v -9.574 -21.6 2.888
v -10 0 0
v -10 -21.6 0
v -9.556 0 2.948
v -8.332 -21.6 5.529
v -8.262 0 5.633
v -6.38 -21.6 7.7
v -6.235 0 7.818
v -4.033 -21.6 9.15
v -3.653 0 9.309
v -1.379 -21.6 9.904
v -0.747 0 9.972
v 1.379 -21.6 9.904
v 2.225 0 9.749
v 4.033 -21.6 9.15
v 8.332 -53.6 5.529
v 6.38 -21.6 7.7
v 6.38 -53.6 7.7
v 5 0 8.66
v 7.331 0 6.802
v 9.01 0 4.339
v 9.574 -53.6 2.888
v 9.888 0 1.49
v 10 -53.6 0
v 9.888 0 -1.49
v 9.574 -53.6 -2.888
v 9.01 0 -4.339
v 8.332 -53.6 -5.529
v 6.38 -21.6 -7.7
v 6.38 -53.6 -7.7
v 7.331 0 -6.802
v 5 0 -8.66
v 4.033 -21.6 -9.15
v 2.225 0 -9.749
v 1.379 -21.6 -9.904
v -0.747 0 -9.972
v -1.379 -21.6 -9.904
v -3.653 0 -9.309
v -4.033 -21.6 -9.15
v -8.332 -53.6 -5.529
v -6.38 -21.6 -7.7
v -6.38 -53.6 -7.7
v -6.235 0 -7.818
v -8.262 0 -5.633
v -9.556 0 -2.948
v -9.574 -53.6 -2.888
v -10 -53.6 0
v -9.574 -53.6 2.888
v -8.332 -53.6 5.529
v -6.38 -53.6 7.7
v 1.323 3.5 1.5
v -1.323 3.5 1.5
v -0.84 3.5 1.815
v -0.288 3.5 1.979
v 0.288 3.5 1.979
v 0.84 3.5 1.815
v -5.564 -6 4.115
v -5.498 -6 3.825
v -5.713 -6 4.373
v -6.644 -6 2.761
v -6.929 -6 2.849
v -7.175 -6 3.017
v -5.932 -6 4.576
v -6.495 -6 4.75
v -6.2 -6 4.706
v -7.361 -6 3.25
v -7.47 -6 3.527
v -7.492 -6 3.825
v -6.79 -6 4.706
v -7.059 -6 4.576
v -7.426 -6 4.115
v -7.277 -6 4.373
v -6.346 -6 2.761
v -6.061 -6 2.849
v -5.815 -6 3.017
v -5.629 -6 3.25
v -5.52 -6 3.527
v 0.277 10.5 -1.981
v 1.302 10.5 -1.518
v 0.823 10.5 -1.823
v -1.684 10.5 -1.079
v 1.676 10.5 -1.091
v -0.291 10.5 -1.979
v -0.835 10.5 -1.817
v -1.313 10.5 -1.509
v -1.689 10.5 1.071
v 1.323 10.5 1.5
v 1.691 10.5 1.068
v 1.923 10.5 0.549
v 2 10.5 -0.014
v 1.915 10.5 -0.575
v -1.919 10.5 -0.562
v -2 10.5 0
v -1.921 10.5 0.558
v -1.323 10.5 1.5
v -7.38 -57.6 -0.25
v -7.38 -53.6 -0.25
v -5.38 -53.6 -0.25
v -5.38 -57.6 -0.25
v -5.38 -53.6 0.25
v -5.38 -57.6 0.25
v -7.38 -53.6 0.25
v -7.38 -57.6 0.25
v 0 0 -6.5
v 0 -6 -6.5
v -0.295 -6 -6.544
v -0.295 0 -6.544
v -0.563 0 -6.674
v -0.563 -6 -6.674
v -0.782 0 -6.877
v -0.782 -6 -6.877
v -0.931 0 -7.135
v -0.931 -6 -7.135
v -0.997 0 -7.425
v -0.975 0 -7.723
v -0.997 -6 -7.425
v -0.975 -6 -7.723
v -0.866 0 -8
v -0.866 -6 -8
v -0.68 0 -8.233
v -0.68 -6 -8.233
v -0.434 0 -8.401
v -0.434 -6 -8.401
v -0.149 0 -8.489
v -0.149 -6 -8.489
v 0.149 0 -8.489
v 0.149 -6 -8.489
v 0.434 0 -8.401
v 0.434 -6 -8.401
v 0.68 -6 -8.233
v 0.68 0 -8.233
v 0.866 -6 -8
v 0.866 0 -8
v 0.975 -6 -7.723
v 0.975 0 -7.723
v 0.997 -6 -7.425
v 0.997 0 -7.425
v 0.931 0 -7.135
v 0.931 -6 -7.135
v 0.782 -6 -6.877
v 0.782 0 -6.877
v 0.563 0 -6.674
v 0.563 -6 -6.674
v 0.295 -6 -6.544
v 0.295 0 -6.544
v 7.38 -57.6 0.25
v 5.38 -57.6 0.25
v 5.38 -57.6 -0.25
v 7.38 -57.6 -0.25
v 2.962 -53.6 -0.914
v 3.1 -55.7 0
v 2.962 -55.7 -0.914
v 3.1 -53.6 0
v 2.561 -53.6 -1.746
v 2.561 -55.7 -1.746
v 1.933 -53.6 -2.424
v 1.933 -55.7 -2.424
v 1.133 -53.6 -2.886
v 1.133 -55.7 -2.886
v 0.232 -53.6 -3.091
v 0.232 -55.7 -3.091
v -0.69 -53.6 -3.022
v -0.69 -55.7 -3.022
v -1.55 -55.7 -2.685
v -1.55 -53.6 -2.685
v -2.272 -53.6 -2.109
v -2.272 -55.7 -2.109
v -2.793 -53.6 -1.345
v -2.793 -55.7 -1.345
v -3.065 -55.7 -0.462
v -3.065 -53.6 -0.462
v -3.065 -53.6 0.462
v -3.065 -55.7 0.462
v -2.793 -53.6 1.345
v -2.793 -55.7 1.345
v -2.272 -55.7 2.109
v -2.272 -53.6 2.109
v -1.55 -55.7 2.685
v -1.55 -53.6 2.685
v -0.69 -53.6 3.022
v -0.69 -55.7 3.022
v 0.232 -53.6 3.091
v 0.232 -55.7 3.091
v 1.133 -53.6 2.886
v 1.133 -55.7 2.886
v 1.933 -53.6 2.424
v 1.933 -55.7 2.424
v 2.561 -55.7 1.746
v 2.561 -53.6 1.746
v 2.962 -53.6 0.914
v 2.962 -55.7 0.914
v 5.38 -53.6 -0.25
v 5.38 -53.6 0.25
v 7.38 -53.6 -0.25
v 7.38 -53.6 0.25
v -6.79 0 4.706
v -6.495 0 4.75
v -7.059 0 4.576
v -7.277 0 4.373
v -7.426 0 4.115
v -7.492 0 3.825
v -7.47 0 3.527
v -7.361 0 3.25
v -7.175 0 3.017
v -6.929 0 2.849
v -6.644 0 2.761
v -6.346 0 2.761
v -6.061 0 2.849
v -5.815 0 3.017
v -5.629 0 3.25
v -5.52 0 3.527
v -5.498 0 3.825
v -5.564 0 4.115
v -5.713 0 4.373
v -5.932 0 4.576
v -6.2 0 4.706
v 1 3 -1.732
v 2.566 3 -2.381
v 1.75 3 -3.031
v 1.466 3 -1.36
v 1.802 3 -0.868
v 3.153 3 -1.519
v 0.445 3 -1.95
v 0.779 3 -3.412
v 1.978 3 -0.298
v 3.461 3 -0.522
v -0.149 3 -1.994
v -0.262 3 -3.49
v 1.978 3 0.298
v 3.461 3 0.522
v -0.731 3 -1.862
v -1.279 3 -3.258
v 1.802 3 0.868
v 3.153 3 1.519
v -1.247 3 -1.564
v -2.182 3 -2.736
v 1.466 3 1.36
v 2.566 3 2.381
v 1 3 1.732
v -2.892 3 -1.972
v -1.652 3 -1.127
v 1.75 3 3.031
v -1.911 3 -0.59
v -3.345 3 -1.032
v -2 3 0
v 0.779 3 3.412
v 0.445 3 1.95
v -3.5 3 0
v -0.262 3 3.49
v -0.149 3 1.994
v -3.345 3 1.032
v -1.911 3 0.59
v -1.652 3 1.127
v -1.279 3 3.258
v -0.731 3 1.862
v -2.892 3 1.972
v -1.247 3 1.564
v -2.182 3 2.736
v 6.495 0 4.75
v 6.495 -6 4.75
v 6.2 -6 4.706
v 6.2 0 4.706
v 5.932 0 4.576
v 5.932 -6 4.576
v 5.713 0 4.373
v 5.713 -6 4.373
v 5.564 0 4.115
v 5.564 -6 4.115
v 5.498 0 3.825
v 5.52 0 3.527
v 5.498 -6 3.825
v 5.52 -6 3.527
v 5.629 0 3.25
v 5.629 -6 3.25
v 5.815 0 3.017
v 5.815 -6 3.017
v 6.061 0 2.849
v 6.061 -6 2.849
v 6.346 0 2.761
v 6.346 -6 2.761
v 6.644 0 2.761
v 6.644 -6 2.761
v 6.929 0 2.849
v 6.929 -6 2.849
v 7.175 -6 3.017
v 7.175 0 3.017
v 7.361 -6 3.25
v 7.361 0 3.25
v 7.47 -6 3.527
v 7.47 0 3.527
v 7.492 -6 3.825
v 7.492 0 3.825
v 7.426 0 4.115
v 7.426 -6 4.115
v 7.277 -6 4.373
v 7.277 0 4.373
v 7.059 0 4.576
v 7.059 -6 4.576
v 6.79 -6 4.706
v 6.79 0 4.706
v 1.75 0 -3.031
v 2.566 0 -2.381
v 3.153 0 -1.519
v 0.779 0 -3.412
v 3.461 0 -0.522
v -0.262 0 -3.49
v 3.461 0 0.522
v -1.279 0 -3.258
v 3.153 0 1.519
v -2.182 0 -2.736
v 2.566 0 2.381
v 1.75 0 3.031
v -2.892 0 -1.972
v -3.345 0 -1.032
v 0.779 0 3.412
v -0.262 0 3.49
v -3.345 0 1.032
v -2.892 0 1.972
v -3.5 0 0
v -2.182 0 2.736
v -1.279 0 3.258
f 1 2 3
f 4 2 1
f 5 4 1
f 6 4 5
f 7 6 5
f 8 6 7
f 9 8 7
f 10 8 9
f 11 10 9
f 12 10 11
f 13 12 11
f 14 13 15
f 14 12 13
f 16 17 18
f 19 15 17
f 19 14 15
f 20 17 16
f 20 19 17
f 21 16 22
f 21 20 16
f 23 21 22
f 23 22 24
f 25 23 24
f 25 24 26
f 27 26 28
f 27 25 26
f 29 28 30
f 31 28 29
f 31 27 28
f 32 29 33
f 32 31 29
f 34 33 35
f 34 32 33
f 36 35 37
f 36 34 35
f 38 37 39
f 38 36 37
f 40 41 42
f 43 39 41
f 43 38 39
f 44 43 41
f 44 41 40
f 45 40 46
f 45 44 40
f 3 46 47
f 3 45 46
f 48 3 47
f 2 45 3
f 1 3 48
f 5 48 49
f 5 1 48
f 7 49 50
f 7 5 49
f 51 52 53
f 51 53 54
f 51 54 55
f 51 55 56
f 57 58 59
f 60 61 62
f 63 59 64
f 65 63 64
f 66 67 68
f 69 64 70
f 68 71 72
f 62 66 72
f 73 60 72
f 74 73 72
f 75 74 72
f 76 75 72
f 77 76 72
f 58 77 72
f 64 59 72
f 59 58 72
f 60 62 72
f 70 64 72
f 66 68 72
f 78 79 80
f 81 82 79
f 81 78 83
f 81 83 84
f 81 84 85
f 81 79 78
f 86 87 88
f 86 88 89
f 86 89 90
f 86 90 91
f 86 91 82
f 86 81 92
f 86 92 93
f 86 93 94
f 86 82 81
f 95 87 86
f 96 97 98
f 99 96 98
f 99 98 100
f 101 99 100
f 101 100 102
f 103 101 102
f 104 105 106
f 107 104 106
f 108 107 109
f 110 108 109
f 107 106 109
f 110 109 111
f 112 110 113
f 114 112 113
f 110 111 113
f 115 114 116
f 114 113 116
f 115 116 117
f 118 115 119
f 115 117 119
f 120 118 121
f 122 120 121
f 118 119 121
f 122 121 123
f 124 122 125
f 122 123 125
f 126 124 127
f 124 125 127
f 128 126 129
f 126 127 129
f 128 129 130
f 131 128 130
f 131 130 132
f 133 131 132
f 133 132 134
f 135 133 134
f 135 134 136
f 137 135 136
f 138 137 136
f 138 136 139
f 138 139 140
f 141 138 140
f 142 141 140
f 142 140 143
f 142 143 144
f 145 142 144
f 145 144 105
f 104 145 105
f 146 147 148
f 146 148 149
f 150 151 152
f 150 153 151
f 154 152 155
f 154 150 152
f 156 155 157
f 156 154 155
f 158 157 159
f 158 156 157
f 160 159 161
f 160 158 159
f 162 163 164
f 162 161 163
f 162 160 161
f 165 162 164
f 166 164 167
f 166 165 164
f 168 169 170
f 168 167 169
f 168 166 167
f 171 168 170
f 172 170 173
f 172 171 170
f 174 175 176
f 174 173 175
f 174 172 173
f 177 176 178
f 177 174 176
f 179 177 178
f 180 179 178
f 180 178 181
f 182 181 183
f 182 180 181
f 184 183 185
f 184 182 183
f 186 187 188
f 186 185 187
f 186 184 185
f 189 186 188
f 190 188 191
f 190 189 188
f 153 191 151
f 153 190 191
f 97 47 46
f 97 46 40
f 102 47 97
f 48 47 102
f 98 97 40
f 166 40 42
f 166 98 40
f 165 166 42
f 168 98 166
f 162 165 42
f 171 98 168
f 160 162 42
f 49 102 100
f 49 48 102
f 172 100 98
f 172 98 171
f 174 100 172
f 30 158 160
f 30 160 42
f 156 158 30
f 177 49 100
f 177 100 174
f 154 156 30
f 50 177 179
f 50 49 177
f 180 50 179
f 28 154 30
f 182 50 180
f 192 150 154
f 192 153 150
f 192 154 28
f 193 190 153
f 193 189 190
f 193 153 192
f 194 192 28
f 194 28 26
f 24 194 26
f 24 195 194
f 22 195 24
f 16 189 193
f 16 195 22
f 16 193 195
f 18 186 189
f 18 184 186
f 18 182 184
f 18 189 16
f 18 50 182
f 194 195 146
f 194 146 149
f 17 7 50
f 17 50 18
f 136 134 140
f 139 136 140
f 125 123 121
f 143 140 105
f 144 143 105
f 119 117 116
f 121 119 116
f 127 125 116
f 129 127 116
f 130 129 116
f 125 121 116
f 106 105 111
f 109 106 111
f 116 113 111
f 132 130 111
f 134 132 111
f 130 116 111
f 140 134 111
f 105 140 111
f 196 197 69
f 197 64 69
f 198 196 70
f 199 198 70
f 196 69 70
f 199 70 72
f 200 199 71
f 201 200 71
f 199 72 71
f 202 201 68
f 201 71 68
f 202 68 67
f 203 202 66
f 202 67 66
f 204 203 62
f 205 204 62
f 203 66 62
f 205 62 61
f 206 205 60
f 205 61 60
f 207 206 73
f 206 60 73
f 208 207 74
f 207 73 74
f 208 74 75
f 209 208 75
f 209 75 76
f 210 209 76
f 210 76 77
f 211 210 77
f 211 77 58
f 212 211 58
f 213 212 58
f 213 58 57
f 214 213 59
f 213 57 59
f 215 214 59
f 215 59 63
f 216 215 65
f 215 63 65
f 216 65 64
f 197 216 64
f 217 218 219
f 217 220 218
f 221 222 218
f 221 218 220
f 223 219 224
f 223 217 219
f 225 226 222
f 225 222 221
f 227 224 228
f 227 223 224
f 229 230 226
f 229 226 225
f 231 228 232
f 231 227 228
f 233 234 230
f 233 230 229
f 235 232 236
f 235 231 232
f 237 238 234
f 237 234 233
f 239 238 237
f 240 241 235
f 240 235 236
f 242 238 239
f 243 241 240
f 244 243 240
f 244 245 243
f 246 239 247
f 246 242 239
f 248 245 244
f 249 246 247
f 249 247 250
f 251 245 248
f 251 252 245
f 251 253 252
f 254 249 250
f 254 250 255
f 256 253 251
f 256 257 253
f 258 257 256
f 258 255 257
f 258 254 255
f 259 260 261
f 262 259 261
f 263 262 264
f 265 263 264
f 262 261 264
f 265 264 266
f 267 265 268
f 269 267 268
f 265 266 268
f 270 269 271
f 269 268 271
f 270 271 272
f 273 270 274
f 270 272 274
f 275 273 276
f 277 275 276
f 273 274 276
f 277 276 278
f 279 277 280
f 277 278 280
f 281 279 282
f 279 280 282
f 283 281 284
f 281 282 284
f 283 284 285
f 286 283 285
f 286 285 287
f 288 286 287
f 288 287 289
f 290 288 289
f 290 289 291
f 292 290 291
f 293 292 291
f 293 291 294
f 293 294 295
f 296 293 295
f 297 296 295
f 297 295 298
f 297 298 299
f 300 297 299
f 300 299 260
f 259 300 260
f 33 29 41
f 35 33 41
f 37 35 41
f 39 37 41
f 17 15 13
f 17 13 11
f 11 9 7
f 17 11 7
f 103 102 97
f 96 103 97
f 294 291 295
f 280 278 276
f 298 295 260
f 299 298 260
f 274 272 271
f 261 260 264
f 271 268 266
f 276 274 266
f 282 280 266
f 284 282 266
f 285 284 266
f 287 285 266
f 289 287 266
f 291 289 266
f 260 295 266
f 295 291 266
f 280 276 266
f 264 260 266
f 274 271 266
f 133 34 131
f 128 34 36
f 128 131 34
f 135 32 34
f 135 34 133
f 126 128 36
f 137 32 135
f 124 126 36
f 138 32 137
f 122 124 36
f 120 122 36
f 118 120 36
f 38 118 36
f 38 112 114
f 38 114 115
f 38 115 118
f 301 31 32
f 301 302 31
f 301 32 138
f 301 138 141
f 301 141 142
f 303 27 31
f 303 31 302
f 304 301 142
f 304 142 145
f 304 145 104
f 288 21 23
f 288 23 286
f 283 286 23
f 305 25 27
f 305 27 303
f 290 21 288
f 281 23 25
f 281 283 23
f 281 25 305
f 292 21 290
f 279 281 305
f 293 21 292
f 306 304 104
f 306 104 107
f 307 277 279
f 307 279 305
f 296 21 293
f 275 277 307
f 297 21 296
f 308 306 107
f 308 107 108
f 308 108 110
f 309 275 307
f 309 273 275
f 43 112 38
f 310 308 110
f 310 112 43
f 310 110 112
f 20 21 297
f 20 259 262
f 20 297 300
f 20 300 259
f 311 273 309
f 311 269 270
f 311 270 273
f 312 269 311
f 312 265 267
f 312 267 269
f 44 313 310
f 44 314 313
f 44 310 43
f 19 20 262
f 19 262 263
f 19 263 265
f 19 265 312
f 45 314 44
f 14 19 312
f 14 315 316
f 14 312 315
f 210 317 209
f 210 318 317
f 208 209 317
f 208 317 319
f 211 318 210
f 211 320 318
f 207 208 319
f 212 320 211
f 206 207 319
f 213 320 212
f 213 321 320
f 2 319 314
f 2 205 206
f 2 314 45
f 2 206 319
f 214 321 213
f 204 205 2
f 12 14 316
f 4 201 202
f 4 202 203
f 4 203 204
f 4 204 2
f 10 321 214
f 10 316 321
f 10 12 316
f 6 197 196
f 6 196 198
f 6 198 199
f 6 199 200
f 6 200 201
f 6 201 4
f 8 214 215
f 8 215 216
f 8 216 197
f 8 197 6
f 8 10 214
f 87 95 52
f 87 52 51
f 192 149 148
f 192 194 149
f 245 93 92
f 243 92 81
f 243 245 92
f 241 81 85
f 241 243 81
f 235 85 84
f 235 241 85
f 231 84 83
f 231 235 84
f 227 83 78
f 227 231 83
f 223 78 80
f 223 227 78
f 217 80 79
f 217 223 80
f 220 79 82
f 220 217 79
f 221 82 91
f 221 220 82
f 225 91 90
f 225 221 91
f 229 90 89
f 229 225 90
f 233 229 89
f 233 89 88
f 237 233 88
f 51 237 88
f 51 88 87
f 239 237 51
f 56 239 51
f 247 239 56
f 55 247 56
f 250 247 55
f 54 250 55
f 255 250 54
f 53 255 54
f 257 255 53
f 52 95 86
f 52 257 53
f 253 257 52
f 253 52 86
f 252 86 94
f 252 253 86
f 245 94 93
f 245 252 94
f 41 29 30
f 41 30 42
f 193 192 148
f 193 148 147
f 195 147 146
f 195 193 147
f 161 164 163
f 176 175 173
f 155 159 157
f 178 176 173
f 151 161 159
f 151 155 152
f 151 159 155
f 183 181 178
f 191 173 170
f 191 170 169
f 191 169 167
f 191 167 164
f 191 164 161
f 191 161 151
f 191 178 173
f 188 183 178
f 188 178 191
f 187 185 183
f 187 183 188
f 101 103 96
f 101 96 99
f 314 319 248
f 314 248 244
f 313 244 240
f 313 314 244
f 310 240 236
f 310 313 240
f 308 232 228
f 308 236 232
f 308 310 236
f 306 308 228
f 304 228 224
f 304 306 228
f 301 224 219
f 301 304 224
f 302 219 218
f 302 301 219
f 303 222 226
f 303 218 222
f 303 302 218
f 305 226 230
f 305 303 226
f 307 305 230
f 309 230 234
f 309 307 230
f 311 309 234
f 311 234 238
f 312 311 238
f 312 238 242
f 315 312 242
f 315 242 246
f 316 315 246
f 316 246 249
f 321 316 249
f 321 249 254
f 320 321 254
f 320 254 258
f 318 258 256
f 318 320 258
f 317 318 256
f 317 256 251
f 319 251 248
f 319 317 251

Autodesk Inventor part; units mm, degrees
ref_plane "YZ Plane" through (0, 0, 0) normal (1, 0, 0) x (0, 1, 0)
ref_plane "XZ Plane" through (0, 0, 0) normal (0, 1, 0) x (-1, 0, 0)
ref_plane "XY Plane" through (0, 0, 0) normal (0, 0, 1) x (1, 0, 0)
sketch "Эскиз1" plane through (0, 0, 0) normal (0, 1, 0) x (-1, 0, 0)
  circle A0 centre (0, 0) radius 10
  circle A1 centre (0, 0) radius 3.5
  circle A2 centre (0, 0) radius 2
  dimension "d0" = 20
  dimension "d1" = 7
  dimension "d2" = 4
extrude "Выдавливание1" add sketch "Эскиз1" against normal blind 21.6 contours A0 | A1 | A2
extrude "Выдавливание2" add sketch "Эскиз1" along normal blind 3 contours A1
extrude "Выдавливание3" add sketch "Эскиз1" along normal blind 10.5 contours A2
sketch "Эскиз2" plane through (0, 10.5, 0) normal (0, 1, 0) x (1, 0, 0)
  circle A0 centre (0, 0) radius 2 projected
  circle A1 centre (0, 0) radius 2 projected
  circle A2 centre (0, 0) radius 3.5 projected
  line L0 (-3.1623, -1.5) -> (3.1623, -1.5)
  point P0 (0, 2)
  point P1 (0, 3.5)
  point P2 (1.3229, -1.5)
  point P3 (-1.3229, -1.5)
  dimension "d9" = 1.5
extrude "Выдавливание4" cut sketch "Эскиз2" against normal blind 7 contours L0 A0 picked at (0.3089, -1.5908)
sketch "Эскиз3" plane through (0, -21.6, 0) normal (0, -1, 0) x (1, 0, 0)
  line L0 (6.3804, -7.7) -> (-6.3804, -7.7)
  line L1 (-6.3804, -7.7) -> (-6.3804, 7.7)
  line L2 (-6.3804, 7.7) -> (6.3804, 7.7)
  line L3 (6.3804, 7.7) -> (6.3804, -7.7)
  circle A0 centre (0, 0) radius 10 projected
  arc A1 (6.3804, -7.7) -> (6.3804, 7.7) centre (0, 0) ccw
  arc A2 (-6.3804, 7.7) -> (-6.3804, -7.7) centre (0, 0) ccw
  line L4 (5.3804, 0.25) -> (7.3804, 0.25)
  line L5 (7.3804, 0.25) -> (7.3804, -0.25)
  line L6 (7.3804, -0.25) -> (5.3804, -0.25)
  line L7 (5.3804, -0.25) -> (5.3804, 0.25)
  line L8 (5.3804, 0.25) -> (7.3804, -0.25) construction
  line L9 (0, -7.7) -> (0, 7.7) construction
  line L10 (-5.3804, 0.25) -> (-7.3804, 0.25)
  line L11 (-7.3804, 0.25) -> (-7.3804, -0.25)
  line L12 (-7.3804, -0.25) -> (-5.3804, -0.25)
  line L13 (-5.3804, -0.25) -> (-5.3804, 0.25)
  point P0 (6.3804, 0)
  point P1 (-6.3804, -7.7)
  dimension "d12" = 15.4
  dimension "d13" = 2
  dimension "d14" = 0.5
extrude "Выдавливание5" add sketch "Эскиз3" along normal blind 36 contours L6 L7 L4 L3 | L3 L4 L5 L6 | L12 L11 L10 L1 | L1 L10 L13 L12
extrude "Выдавливание6" add sketch "Эскиз3" along normal blind 32 contours L0 L1 L12 L13 L10 L2 L3 L4 L7 L6 | L3 L6 L5 L4 A0 | A0 L1 L10 L11 L12
sketch "Эскиз4" plane through (0, -53.6, 0) normal (0, -1, 0) x (1, 0, 0)
  circle A0 centre (0, 0) radius 2 projected
  circle A1 centre (0, 0) radius 3.1
  dimension "d19" = 6.2
extrude "Выдавливание7" add sketch "Эскиз4" along normal blind 2.1 contours A0 | A1
sketch "Эскиз5" plane through (0, 0, 0) normal (0, 1, 0) x (1, 0, 0)
  circle A0 centre (0, 0) radius 3.5 projected
  line L0 (0, 0) -> (0, 7.5) construction
  circle A1 centre (0, 7.5) radius 1 construction
  circle A2 centre (-6.4952, -3.75) radius 1 construction
  circle A3 centre (6.4952, -3.75) radius 1 construction
  dimension "d39" = 2
  dimension "d40" = 7.5
  dimension "d43" = 360
hole "Отверстие3" at (0, 0, -7.5) at (6.4952, 0, 3.75) at (-6.4952, 0, 3.75) direction (0, -1, 0) diameter 2 depth 6
properties part number "motor20" material "Сталь"
